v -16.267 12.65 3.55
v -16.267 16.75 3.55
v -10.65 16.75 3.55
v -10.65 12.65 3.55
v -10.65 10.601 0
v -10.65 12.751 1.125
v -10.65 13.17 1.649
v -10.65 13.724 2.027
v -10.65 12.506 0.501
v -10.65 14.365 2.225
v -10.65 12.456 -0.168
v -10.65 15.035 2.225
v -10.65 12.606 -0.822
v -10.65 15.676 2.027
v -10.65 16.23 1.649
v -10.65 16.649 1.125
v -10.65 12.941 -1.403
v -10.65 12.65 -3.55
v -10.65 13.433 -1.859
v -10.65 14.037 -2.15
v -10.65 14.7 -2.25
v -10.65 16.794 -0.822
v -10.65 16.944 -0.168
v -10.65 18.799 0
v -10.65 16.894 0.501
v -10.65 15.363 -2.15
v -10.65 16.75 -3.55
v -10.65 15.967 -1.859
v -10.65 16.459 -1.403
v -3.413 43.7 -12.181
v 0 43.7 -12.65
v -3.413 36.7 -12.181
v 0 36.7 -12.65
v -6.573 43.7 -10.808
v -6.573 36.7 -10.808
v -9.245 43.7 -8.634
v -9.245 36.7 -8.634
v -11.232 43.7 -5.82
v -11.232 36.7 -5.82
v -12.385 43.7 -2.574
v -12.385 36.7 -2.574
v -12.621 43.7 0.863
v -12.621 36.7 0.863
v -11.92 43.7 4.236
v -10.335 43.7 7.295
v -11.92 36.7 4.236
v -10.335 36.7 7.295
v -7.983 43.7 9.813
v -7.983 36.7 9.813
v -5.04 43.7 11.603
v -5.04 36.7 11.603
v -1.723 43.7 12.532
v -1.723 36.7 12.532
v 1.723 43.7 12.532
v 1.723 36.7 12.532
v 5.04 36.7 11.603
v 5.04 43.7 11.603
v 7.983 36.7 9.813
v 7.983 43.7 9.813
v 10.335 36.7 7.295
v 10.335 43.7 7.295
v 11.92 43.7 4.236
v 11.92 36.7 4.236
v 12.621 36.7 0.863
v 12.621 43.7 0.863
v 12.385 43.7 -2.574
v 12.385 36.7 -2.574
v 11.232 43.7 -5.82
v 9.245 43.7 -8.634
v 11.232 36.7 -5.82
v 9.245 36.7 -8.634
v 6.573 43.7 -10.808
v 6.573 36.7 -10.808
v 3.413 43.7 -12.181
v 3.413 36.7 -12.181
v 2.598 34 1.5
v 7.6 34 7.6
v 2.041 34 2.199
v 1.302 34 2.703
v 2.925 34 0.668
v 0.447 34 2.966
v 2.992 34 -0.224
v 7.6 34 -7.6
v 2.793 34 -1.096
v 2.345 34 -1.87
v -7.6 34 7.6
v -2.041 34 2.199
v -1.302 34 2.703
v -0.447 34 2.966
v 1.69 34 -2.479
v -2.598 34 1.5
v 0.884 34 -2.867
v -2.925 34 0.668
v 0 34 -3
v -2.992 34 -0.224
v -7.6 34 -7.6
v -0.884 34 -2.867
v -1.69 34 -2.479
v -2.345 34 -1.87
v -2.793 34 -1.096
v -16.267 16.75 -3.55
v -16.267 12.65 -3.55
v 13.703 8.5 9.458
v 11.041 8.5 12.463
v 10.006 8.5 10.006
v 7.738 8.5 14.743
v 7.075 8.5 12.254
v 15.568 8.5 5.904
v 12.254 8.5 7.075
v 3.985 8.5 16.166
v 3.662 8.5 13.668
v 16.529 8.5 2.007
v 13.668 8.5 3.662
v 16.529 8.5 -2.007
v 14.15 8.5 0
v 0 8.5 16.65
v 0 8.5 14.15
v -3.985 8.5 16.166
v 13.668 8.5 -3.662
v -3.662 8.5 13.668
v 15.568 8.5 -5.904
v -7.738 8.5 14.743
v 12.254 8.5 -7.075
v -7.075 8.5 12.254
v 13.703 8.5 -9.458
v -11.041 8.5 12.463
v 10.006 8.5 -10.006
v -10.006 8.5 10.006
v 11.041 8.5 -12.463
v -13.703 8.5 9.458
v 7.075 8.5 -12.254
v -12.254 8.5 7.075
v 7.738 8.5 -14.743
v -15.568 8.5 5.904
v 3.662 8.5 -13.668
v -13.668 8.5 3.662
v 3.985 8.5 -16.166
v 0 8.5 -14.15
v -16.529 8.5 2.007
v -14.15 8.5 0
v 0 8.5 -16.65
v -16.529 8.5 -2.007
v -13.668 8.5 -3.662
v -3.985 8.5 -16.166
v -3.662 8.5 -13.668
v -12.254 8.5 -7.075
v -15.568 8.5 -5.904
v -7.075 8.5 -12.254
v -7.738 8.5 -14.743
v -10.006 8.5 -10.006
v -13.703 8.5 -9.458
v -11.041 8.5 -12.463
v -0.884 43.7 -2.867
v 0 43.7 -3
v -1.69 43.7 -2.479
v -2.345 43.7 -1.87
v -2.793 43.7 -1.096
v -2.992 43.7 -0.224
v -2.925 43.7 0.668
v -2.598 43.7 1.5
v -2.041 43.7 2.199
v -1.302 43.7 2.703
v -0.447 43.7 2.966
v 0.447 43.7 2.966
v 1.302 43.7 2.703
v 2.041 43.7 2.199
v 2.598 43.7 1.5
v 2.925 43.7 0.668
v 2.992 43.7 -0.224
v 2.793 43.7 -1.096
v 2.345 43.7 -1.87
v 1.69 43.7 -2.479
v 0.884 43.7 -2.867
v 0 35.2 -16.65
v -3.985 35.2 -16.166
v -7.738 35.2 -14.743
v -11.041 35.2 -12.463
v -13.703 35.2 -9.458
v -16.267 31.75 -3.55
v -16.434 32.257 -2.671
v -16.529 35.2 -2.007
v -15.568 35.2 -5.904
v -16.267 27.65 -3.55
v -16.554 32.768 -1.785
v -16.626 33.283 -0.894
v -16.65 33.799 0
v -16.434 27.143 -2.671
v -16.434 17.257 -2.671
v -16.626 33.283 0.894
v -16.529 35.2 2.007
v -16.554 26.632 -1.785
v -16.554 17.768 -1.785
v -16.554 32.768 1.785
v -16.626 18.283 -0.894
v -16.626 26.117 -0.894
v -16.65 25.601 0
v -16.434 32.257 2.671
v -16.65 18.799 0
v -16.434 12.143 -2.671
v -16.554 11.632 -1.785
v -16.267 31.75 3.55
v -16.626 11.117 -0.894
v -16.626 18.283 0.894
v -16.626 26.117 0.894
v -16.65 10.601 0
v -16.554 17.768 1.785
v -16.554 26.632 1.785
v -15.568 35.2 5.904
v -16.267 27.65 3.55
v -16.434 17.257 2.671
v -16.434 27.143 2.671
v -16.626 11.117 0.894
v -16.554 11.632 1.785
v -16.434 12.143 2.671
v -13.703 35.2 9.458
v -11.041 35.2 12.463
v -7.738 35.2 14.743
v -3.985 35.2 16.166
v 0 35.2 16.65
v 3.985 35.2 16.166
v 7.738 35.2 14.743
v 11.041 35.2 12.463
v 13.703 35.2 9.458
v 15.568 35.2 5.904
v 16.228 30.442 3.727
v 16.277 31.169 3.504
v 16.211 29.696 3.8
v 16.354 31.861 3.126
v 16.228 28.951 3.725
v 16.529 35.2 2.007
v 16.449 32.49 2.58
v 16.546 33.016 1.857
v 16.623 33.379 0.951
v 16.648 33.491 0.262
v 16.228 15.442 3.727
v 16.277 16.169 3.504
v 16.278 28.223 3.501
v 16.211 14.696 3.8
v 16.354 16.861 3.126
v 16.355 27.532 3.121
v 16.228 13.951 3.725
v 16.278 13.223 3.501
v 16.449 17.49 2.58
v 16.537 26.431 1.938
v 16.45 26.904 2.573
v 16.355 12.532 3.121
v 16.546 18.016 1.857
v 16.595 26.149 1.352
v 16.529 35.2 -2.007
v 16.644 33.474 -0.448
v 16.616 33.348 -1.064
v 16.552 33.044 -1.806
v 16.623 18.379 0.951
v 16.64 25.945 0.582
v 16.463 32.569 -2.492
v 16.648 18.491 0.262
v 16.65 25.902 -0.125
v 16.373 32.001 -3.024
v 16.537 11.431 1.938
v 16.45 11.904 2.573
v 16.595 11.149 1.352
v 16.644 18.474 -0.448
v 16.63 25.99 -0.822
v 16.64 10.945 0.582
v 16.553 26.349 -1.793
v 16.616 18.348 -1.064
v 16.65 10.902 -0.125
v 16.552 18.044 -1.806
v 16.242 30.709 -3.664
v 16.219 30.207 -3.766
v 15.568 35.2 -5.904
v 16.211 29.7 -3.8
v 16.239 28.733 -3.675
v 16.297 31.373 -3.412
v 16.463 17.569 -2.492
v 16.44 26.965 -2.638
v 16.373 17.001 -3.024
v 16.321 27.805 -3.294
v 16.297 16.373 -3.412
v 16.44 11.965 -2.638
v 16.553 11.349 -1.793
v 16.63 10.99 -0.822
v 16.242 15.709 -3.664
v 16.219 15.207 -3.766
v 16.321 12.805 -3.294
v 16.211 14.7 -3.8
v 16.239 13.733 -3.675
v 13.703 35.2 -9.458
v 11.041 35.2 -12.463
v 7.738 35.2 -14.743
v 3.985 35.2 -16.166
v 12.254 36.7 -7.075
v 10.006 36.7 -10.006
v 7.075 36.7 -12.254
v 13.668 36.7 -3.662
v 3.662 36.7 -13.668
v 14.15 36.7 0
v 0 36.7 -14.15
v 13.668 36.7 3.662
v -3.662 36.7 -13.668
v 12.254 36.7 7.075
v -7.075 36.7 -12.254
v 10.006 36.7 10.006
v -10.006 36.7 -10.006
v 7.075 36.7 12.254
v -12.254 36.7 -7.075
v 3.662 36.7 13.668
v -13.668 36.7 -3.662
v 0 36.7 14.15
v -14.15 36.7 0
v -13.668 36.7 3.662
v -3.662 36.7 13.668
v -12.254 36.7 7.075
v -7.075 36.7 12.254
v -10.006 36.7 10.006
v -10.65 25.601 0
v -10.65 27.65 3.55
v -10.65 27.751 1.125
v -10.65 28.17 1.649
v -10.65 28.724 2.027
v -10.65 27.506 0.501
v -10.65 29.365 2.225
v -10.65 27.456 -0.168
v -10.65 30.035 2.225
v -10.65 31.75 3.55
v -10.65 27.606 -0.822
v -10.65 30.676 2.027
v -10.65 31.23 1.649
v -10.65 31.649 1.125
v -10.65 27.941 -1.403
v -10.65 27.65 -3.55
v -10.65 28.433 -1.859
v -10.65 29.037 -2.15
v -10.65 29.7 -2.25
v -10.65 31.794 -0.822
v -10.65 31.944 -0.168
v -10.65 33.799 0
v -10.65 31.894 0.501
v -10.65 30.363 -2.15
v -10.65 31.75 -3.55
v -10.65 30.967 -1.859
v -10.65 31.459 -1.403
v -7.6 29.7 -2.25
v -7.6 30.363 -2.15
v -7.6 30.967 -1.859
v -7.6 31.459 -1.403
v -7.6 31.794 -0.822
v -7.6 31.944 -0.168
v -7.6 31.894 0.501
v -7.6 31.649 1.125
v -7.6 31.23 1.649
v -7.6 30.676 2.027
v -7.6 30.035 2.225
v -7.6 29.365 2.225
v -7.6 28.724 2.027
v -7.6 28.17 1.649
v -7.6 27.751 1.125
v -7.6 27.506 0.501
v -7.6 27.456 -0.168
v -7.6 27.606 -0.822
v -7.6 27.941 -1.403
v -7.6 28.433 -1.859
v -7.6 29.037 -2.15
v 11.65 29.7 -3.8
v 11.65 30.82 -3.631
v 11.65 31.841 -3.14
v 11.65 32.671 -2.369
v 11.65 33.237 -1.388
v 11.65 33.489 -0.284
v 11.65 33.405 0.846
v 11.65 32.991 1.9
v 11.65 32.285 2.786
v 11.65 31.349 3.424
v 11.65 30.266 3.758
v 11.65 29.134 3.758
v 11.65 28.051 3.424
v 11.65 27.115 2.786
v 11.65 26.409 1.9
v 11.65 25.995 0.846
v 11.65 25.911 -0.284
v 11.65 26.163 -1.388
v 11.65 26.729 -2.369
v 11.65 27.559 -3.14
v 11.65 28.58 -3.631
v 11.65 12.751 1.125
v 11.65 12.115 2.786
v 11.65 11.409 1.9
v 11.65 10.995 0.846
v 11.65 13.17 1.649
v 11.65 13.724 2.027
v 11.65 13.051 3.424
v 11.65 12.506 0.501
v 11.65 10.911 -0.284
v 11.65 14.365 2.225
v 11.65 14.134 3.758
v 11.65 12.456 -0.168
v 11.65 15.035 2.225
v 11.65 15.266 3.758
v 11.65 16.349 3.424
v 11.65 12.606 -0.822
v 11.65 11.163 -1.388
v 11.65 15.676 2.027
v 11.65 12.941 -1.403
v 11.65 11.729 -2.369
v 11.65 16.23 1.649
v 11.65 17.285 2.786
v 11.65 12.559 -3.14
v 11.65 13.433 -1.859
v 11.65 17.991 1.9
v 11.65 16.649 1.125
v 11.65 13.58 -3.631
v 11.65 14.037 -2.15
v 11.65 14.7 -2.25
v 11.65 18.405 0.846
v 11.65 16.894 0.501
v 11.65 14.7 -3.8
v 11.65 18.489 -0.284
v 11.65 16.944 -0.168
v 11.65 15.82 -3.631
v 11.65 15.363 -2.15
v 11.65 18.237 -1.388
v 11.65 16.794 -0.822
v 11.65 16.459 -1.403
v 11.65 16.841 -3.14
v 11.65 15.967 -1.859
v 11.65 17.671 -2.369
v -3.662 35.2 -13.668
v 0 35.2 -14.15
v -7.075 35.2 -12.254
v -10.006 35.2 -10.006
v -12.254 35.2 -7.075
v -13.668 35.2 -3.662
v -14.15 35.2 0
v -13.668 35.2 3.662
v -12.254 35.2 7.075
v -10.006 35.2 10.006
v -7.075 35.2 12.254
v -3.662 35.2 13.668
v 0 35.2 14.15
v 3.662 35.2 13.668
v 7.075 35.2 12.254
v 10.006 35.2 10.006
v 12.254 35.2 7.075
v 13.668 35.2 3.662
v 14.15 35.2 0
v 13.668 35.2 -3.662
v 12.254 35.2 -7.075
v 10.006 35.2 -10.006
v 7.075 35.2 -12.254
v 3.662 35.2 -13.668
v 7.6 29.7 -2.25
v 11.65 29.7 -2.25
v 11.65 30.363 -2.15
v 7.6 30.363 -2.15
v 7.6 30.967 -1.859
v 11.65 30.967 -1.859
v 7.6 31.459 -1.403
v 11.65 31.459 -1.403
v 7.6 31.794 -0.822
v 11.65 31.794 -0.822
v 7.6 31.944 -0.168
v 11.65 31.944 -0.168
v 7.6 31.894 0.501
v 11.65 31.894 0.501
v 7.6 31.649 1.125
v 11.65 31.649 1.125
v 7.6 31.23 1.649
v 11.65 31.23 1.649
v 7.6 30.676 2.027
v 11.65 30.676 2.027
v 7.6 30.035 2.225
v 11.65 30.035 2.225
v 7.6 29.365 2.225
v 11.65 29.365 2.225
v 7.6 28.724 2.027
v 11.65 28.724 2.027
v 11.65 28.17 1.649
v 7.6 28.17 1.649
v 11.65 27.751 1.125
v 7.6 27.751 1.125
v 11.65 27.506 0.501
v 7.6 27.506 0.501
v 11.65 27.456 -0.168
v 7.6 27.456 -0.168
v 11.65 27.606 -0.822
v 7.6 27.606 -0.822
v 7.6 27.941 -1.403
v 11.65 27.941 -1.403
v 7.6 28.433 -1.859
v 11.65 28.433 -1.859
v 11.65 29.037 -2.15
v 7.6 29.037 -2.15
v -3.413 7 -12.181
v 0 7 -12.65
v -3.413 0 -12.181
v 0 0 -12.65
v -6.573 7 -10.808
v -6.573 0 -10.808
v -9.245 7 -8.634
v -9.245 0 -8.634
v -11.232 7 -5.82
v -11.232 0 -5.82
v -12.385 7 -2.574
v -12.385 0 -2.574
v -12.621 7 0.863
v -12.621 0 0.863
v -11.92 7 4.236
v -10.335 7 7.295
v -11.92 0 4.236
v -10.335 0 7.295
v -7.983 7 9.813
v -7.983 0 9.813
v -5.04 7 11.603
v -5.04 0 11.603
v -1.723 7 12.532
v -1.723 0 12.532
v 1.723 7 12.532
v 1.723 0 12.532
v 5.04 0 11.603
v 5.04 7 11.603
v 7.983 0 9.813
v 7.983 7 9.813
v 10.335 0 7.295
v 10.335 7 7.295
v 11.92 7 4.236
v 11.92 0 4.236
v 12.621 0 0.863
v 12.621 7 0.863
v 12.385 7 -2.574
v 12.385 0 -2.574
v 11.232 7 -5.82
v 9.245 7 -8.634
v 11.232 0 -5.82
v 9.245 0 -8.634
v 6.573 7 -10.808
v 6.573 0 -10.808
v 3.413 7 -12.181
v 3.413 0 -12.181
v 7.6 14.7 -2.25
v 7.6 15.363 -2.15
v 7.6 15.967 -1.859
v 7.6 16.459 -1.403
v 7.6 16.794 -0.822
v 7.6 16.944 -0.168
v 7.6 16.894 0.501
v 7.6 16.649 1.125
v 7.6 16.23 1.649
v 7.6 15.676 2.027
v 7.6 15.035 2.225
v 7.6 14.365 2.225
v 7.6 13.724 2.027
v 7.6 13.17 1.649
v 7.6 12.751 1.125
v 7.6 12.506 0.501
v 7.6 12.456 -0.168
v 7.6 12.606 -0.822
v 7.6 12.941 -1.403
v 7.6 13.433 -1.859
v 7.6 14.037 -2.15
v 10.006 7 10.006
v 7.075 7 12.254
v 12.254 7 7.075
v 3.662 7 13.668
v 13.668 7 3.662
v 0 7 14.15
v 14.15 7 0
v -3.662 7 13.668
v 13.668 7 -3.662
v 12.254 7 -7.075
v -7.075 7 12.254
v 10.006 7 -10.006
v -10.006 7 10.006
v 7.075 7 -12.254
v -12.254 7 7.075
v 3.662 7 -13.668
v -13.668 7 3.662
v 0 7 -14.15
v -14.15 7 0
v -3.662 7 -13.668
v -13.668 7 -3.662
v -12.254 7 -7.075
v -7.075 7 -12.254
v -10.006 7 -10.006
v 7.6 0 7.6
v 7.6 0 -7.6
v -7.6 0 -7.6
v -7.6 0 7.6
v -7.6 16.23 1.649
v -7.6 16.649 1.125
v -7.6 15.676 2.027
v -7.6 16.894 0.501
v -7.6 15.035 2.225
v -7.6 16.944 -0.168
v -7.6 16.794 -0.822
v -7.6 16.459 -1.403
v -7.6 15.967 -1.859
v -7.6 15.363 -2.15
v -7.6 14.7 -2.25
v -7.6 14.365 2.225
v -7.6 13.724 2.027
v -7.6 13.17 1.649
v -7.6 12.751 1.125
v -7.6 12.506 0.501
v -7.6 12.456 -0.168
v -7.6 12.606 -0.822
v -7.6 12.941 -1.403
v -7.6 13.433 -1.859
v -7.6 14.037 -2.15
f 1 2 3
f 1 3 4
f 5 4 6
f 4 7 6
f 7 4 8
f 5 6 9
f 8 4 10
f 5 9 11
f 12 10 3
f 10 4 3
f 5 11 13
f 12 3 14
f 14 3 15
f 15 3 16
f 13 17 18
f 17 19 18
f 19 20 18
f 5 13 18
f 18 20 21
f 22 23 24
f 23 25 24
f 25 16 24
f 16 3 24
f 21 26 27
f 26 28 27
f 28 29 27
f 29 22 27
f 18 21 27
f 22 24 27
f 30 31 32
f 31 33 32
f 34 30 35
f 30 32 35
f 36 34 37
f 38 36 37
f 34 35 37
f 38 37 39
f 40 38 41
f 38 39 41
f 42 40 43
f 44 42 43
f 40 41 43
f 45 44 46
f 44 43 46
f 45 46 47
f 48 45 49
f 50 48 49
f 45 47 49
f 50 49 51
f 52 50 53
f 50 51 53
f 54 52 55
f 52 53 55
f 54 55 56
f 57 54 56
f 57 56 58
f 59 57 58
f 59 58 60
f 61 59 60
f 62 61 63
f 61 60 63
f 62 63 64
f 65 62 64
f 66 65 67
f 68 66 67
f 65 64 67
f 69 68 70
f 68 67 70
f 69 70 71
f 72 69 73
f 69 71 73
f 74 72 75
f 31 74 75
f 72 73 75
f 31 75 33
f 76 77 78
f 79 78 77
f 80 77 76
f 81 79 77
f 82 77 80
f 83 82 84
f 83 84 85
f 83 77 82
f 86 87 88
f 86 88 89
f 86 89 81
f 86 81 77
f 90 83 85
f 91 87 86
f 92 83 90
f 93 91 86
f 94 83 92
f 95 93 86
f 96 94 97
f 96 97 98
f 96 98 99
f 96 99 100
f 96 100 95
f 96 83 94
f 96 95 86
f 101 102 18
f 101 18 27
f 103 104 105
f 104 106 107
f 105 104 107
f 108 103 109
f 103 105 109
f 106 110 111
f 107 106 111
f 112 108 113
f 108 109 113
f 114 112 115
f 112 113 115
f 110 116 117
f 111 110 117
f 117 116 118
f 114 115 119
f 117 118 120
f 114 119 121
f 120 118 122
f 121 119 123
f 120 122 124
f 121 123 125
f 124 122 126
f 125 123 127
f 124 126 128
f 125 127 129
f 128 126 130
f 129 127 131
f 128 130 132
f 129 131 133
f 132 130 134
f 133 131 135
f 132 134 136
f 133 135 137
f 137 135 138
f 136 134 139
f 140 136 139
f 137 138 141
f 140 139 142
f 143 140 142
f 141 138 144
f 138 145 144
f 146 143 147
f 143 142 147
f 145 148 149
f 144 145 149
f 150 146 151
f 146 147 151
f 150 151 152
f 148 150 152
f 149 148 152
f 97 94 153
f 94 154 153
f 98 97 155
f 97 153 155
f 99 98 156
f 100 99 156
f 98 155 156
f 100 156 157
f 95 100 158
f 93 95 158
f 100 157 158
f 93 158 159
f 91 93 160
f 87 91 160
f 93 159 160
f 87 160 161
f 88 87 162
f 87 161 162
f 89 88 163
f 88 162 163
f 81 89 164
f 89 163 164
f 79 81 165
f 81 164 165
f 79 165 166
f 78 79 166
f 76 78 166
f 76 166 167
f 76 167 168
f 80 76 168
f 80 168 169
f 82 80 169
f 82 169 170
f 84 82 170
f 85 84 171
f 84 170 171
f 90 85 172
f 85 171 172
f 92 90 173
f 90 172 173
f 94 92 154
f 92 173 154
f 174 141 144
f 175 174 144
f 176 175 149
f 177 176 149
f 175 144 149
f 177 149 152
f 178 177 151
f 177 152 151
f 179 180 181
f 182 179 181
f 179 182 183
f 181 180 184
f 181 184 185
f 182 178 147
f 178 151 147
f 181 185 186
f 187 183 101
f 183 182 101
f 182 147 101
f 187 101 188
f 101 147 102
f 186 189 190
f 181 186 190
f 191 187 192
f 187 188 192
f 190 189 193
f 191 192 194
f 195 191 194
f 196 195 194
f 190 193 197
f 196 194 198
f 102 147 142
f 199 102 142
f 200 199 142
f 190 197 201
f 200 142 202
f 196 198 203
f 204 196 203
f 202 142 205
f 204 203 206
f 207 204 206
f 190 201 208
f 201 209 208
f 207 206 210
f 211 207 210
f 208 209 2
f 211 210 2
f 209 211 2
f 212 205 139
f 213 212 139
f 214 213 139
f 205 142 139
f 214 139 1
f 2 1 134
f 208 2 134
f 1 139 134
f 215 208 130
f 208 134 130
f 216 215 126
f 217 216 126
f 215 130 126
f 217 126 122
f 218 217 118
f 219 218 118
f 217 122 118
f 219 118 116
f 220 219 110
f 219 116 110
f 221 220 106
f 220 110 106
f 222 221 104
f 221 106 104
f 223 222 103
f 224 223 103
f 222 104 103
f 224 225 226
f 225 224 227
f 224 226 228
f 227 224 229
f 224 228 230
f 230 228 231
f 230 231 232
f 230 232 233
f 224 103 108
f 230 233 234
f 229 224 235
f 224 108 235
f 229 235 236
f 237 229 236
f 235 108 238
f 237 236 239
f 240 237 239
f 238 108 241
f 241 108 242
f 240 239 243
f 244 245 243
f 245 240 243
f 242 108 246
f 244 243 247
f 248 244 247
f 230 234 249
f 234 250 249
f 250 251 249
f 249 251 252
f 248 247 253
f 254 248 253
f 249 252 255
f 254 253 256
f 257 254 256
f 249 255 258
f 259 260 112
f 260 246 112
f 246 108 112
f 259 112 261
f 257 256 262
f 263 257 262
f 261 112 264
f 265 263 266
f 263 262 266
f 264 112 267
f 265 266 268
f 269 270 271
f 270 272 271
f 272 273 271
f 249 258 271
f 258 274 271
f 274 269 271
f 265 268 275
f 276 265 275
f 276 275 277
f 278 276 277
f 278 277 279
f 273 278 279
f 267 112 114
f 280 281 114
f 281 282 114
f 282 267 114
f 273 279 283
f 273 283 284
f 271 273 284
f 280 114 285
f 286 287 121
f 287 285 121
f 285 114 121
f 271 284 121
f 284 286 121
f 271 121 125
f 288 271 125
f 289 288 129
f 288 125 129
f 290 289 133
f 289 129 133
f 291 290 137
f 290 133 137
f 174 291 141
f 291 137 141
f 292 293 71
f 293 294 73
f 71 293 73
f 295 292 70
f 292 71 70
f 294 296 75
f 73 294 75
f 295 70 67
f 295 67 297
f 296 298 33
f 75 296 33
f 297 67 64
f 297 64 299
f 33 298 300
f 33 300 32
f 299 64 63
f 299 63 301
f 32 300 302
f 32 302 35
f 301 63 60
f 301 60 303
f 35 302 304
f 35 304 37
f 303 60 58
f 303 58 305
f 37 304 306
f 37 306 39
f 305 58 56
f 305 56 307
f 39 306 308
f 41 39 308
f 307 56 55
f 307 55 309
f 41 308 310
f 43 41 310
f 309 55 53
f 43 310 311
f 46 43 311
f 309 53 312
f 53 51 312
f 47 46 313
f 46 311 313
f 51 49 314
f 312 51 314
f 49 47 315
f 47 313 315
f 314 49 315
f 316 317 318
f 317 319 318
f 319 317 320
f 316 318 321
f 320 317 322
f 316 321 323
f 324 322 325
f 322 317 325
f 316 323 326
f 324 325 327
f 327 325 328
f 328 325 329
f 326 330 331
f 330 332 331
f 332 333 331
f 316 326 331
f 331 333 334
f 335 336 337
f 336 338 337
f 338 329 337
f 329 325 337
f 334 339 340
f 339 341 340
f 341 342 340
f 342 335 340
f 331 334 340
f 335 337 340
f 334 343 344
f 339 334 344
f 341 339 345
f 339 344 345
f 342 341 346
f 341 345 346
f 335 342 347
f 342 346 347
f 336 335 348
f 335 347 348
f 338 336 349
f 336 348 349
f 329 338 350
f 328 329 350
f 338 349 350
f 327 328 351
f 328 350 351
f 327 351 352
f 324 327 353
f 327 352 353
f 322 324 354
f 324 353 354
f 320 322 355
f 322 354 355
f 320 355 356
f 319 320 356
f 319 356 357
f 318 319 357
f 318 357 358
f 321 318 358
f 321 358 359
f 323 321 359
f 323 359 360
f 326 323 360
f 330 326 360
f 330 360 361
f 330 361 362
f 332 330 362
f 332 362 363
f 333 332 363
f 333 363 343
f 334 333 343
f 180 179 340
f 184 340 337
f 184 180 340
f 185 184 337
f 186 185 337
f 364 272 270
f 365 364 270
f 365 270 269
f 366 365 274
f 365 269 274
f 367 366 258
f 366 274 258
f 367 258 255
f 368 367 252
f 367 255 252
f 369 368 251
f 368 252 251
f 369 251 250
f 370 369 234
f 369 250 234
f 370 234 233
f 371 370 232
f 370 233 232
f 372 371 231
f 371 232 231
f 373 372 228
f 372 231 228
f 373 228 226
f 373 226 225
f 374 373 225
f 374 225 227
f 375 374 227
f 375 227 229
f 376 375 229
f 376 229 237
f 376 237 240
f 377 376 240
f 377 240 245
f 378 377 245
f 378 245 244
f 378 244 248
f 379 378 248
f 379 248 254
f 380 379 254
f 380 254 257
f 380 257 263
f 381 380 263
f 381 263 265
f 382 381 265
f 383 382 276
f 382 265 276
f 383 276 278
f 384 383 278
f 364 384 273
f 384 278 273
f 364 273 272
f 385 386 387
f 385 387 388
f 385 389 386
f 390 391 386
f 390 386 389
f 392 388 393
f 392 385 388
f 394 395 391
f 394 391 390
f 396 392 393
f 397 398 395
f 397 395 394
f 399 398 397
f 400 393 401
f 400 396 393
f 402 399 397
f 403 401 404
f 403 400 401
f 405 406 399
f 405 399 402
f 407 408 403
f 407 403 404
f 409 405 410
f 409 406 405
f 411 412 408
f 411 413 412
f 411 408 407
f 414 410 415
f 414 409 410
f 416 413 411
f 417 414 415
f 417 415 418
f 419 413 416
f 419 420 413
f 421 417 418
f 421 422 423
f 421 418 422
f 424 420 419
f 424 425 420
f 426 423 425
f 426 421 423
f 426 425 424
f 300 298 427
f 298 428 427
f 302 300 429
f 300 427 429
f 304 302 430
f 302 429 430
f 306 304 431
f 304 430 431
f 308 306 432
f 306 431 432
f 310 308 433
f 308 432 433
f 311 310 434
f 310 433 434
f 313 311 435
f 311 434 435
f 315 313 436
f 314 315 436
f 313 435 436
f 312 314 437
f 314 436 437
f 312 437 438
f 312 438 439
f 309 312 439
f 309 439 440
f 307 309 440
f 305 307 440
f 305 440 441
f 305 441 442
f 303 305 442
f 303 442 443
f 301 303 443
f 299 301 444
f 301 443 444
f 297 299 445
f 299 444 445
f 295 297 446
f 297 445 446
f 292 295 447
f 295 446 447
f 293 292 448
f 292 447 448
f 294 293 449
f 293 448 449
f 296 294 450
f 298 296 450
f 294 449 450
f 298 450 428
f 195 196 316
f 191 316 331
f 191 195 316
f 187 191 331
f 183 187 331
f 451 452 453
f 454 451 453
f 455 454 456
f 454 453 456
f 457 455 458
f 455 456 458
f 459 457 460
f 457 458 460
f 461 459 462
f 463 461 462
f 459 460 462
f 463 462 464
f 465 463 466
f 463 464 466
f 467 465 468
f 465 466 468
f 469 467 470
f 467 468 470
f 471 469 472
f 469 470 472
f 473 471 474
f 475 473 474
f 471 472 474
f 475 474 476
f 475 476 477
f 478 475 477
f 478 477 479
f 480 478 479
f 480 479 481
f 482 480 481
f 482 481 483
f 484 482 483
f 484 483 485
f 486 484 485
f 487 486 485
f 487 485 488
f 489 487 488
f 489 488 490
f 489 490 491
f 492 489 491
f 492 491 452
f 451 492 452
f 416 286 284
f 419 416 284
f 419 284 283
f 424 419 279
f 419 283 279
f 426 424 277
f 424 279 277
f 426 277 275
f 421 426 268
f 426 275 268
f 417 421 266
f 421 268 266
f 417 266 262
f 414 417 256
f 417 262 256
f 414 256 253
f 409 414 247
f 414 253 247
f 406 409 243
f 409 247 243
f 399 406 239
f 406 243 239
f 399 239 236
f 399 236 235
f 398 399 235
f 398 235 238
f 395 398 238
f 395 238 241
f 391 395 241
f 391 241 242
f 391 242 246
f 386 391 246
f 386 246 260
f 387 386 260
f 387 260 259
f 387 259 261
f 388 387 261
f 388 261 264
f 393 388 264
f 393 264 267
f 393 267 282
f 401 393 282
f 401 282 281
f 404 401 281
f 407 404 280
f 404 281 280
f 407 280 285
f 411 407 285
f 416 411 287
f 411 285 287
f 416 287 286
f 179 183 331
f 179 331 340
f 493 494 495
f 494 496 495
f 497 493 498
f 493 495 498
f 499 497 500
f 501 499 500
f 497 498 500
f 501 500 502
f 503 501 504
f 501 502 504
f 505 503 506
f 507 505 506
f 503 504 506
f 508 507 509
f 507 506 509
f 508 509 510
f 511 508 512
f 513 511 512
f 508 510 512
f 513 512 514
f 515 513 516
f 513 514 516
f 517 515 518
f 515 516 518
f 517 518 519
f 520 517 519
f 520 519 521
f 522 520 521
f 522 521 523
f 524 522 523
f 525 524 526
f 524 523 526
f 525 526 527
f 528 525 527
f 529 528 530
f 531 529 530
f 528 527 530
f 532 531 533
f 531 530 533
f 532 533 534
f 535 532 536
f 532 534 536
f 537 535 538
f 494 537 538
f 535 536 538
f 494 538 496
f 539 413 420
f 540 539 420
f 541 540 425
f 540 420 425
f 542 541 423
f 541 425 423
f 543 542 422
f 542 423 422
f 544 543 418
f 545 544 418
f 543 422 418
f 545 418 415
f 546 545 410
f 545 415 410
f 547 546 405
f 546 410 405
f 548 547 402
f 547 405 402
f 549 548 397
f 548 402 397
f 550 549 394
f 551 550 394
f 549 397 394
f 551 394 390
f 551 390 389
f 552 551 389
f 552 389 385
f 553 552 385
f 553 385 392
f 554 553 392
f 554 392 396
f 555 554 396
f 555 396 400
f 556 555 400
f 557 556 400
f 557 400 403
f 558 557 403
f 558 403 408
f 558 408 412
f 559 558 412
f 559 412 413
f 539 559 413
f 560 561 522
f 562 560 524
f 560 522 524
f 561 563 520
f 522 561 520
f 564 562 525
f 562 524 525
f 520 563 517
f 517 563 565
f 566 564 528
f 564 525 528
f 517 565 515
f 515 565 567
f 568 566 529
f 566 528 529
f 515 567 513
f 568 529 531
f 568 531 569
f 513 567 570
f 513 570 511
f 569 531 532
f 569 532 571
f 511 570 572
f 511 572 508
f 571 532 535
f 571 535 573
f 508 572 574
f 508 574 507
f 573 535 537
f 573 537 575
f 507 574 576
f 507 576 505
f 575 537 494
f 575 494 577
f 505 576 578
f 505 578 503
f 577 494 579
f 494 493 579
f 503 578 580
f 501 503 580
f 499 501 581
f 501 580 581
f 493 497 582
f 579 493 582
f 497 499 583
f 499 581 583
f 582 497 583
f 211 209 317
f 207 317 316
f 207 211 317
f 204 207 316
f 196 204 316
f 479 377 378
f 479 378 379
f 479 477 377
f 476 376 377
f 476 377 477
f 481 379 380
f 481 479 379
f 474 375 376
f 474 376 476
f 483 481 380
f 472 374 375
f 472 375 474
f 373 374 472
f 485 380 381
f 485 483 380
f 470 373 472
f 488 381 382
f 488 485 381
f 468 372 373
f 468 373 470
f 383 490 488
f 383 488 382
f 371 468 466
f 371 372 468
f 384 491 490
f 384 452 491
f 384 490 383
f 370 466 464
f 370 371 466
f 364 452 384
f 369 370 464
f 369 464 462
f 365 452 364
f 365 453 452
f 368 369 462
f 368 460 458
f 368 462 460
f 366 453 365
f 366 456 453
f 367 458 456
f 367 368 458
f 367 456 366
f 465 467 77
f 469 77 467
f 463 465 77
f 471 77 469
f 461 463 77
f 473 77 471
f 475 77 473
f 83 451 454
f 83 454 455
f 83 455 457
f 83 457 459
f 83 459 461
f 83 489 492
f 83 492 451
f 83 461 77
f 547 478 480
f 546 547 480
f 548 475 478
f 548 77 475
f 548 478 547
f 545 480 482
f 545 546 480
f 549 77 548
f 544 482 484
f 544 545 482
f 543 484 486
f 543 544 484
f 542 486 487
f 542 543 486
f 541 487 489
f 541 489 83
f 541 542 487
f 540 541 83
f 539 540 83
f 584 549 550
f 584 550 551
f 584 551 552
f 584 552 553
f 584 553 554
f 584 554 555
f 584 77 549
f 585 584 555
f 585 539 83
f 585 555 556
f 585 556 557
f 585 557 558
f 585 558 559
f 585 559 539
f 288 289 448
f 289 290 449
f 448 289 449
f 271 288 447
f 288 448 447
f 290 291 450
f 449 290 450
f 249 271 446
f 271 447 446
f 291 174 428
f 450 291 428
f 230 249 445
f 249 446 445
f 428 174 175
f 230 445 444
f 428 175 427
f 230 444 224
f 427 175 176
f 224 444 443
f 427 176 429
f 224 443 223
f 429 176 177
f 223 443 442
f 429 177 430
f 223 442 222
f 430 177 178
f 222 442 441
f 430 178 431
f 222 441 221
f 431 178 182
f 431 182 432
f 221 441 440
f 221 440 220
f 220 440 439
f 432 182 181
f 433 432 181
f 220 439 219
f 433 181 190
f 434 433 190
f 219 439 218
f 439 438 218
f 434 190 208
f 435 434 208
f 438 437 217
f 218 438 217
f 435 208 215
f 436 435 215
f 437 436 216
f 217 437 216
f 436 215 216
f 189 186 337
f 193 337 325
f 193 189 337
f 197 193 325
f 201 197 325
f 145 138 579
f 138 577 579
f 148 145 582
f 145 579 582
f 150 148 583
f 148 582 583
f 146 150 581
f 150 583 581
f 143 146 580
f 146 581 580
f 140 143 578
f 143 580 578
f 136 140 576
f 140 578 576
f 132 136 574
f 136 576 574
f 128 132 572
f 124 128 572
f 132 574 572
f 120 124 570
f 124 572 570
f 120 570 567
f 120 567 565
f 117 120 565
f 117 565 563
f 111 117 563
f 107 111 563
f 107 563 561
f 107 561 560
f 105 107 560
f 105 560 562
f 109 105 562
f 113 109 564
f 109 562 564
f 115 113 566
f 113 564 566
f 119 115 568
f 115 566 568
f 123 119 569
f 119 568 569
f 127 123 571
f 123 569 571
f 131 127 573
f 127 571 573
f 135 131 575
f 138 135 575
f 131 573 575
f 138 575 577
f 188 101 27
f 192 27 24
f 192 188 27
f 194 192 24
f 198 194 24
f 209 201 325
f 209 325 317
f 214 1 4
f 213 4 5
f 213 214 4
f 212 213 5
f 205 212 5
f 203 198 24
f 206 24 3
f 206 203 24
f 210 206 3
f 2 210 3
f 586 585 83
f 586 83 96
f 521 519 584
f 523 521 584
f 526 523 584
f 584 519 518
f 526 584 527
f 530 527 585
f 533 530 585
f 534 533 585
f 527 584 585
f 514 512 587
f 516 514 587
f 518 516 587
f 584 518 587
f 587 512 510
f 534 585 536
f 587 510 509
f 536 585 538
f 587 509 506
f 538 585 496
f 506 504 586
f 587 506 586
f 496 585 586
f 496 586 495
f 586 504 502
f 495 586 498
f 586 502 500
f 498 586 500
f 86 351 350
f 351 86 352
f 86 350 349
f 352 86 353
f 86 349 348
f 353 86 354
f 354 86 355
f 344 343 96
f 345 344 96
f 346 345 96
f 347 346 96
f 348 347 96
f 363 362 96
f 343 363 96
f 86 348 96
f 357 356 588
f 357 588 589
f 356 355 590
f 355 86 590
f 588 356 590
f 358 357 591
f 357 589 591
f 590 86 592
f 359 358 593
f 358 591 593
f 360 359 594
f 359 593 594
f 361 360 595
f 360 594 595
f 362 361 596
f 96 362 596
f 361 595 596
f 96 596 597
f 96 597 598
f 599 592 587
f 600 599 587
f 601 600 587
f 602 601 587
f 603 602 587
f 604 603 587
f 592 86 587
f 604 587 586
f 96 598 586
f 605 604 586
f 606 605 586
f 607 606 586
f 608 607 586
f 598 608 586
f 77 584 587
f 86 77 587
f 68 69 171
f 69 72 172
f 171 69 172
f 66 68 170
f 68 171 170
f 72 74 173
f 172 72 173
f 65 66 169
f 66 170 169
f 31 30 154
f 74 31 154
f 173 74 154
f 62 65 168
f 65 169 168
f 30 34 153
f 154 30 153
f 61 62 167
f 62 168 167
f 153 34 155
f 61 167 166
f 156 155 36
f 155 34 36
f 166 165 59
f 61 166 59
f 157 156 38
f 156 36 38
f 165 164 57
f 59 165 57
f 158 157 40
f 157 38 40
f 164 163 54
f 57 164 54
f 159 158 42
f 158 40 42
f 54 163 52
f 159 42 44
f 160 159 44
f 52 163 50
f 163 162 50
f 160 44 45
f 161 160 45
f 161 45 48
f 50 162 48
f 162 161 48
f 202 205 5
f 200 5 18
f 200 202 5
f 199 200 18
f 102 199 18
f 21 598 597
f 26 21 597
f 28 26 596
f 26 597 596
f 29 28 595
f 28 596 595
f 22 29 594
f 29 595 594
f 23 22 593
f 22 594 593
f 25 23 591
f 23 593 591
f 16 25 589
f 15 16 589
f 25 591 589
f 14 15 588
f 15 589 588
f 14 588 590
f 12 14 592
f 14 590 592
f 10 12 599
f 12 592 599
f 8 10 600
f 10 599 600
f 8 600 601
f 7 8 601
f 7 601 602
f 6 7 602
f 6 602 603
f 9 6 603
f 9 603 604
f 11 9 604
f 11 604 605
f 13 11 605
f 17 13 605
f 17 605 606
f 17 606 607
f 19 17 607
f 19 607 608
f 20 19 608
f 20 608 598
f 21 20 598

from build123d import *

# Parameters (mm, degrees)
SKETCH_1102_W          = 15.2
SKETCH_1102_H          = 15.2
CUT_EXTRUDE_1177_DEPTH = 34
SKETCH_1232_R          = 2.25
CUT_EXTRUDE_1504_DEPTH = 58.409080292
SKETCH_3_R             = 3.8
SKETCH_3_R_2           = 2.25
CUT_EXTRUDE_1538_DEPTH = 5
CUT_EXTRUDE_2118_DEPTH = 6


with BuildPart() as part:
    # Sketch 450 → Повернуть1 (revolve)
    with BuildSketch(Plane.XY):
        Polygon((3, 43.7), (12.65, 43.7), (12.65, 36.7), (14.15, 36.7), (14.15, 35.2), (16.65, 35.2), (16.65, 8.5), (14.15, 8.5), (14.15, 7), (12.65, 7), (12.65, 0), (0, 0), (0, 30.2), (3, 30.2), align=None)
    revolve(axis=Axis((0, 0, 0), (0, 1, 0)))

    # Sketch 1102 → Cut-Extrude 1177 (cut)
    with BuildSketch(Plane(origin=(0, 0, 0), x_dir=(-1, 0, 0), z_dir=(0, -1, 0))):
        Rectangle(SKETCH_1102_W, SKETCH_1102_H)
    extrude(amount=-CUT_EXTRUDE_1177_DEPTH, mode=Mode.SUBTRACT)

    # Sketch 1232 → Cut-Extrude 1504 (cut, through all)
    with BuildSketch(Plane(origin=(16.65, 0, 0), x_dir=(0, 0, -1), z_dir=(1, 0, 0))):
        with Locations((0, 29.7)):
            Circle(SKETCH_1232_R)
        with Locations((0, 14.7)):
            Circle(SKETCH_1232_R)
    extrude(amount=-CUT_EXTRUDE_1504_DEPTH, mode=Mode.SUBTRACT)

    # Sketch 3 → Cut-Extrude 1538 (cut)
    # profile 1 of 2: a face of its own
    with BuildSketch(Plane(origin=(16.65, 0, 0), x_dir=(0, 0, -1), z_dir=(1, 0, 0))):
        with Locations((0, 29.7)):
            Circle(SKETCH_3_R)
        with Locations((0, 29.7)):
            Circle(SKETCH_3_R_2, mode=Mode.SUBTRACT)
    # profile 2 of 2: a face of its own
    with BuildSketch(Plane(origin=(16.65, 0, 0), x_dir=(0, 0, -1), z_dir=(1, 0, 0))):
        with Locations((0, 14.7)):
            Circle(SKETCH_3_R)
        with Locations((0, 14.7)):
            Circle(SKETCH_3_R_2, mode=Mode.SUBTRACT)
    extrude(amount=-CUT_EXTRUDE_1538_DEPTH, mode=Mode.SUBTRACT)

    # Sketch 1662 → Cut-Extrude 2118 (cut)
    with BuildSketch(Plane.ZY.offset(16.65)):
        Polygon((3.55, 31.749593456), (0, 33.799186911), (-3.55, 31.749593456), (-3.55, 27.650406544), (0, 25.600813089), (3.55, 27.650406544), align=None)
        Polygon((3.55, 16.749593456), (0, 18.799186911), (-3.55, 16.749593456), (-3.55, 12.650406544), (0, 10.600813089), (3.55, 12.650406544), align=None)
    extrude(amount=-CUT_EXTRUDE_2118_DEPTH, mode=Mode.SUBTRACT)


solid = part.part
